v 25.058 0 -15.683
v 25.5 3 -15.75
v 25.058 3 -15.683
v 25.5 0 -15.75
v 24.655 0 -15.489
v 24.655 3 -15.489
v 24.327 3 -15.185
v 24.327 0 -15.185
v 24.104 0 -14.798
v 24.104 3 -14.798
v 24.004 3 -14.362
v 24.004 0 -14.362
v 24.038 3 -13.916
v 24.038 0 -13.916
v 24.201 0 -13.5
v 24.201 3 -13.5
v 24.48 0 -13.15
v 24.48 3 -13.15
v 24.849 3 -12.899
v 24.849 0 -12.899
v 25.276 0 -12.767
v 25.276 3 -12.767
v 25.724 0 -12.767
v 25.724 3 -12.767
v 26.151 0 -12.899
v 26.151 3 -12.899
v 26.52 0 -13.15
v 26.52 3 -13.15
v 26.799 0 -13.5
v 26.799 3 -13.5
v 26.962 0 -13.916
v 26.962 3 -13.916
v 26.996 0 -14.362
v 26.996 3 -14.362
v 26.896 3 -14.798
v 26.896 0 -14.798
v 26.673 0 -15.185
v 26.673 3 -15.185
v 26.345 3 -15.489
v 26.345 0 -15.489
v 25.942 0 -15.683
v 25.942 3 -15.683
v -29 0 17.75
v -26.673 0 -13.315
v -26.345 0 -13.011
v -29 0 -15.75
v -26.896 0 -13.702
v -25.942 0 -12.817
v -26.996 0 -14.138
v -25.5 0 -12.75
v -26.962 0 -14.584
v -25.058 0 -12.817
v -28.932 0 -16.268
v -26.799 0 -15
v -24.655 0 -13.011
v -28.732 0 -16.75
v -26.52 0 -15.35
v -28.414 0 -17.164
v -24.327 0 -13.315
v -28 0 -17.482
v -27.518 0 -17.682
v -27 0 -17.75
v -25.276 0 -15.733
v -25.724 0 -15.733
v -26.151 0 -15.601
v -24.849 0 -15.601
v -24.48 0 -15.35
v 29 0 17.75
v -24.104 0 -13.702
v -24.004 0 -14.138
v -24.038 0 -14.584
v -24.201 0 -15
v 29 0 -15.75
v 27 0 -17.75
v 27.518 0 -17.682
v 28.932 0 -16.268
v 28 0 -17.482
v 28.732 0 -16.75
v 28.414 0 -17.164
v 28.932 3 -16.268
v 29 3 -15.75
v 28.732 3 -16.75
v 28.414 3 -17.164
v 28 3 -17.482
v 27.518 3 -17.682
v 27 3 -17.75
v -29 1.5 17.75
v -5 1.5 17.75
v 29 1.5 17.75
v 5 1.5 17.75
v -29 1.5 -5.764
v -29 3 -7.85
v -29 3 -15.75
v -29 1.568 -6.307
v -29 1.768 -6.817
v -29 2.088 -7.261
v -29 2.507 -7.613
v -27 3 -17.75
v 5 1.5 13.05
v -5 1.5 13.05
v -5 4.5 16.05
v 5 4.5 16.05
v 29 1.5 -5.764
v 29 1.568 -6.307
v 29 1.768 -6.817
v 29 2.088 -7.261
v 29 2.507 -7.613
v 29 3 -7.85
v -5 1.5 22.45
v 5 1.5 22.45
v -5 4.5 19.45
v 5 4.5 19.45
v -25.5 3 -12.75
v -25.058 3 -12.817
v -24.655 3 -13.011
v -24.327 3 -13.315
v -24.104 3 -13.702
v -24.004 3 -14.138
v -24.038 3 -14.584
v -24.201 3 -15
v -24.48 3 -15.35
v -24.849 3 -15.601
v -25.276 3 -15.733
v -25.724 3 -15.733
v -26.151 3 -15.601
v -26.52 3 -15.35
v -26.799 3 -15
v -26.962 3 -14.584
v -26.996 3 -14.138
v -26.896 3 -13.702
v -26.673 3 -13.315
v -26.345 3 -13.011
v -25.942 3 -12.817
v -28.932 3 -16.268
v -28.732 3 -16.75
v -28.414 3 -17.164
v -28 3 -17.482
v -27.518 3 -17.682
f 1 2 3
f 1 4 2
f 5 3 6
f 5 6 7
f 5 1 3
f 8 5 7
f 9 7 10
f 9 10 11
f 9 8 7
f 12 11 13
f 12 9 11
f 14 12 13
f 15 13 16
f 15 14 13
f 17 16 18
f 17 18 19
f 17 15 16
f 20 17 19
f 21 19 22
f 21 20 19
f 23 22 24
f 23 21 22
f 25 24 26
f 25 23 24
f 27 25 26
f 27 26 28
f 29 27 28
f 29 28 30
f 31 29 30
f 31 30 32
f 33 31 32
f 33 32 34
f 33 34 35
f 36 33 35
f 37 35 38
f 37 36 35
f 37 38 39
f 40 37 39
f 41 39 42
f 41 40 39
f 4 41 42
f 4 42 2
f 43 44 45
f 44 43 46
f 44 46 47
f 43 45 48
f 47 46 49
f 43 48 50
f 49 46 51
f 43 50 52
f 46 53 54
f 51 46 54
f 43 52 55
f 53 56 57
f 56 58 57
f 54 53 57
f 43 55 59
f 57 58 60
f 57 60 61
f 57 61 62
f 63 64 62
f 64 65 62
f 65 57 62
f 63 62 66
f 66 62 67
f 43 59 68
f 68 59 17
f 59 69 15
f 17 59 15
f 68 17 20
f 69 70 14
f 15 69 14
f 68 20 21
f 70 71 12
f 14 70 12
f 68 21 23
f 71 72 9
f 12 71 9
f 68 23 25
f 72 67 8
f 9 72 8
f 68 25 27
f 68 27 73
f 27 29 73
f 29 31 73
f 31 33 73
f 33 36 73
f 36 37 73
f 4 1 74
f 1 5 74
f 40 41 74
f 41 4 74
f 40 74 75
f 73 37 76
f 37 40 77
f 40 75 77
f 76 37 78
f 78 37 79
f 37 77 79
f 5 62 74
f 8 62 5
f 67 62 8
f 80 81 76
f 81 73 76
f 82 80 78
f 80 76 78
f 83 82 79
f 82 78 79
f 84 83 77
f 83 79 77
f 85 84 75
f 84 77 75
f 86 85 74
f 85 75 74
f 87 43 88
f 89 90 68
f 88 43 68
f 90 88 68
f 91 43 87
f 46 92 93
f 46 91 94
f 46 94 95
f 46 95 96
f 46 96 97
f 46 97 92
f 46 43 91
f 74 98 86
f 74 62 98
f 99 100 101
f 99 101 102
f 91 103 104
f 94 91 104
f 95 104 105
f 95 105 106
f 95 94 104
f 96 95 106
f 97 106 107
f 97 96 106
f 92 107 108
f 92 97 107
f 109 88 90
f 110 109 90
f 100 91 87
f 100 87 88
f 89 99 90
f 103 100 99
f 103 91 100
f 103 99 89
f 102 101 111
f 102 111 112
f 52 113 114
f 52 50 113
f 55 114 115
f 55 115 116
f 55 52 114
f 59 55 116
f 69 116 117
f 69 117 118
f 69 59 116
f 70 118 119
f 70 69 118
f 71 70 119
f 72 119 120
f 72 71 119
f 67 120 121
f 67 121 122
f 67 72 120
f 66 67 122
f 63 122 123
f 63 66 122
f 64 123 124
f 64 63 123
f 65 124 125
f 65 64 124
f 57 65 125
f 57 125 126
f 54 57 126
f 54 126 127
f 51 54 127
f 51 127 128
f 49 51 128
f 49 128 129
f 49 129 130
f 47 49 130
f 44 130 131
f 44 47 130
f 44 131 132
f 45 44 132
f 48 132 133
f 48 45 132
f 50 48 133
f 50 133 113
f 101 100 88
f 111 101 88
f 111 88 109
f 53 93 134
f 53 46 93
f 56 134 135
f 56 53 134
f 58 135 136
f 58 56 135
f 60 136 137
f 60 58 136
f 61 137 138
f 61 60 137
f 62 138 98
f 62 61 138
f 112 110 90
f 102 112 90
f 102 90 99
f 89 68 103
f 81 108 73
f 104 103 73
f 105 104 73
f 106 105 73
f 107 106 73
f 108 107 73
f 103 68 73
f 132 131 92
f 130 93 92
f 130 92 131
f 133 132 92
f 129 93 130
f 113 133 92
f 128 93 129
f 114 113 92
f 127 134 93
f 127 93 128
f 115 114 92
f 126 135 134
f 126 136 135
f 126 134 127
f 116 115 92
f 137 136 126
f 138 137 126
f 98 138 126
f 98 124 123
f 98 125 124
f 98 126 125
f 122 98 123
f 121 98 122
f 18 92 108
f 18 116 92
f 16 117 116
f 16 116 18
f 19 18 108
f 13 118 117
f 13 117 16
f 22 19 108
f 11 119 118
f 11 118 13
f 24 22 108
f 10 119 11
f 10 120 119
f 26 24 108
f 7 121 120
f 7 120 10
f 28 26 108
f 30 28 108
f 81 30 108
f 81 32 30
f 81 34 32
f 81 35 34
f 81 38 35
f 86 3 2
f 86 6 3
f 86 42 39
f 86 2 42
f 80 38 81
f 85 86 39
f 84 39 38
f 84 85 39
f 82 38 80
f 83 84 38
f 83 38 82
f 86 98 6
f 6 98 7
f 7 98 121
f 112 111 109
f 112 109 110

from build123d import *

# Parameters (mm, degrees)
SKETCH1_W           = 58
SKETCH1_H           = 35.5
SKETCH1_R           = 1.5
BOSS_EXTRUDE1_DEPTH = 1.5
SKETCH2_W           = 58
SKETCH2_H           = 9.9
SKETCH2_R           = 1.5
BOSS_EXTRUDE3_DEPTH = 1.5
FILLET1_R           = 2.2
SKETCH2_3_W         = 10
SKETCH2_3_H         = 4.7
BOSS_EXTRUDE4_DEPTH = 3
CHAMFER1_SIZE       = 3
FILLET2_R           = 2


# Some blends are built 0.0001 mm under size
with BuildPart() as part:
    # Sketch1 → Boss-Extrude1 (new body)
    with BuildSketch(Plane(origin=(0, 0, 0), x_dir=(1, 0, 0), z_dir=(0, 1, 0))):
        Rectangle(SKETCH1_W, SKETCH1_H)
        with Locations(Location((-25.5, 14.25, 0), (0, 0, 270))):
            Circle(SKETCH1_R, mode=Mode.SUBTRACT)
        with Locations(Location((25.5, 14.25, 0), (0, 0, 90))):
            Circle(SKETCH1_R, mode=Mode.SUBTRACT)
    extrude(amount=BOSS_EXTRUDE1_DEPTH)

    # Sketch2 → Boss-Extrude3 (add)
    with BuildSketch(Plane(origin=(0, 1.5, 0), x_dir=(1, 0, 0), z_dir=(0, 1, 0))):
        with Locations((0, 12.8)):
            Rectangle(SKETCH2_W, SKETCH2_H)
        with Locations(Location((-25.5, 14.25, 0), (0, 0, 270))):
            Circle(SKETCH2_R, mode=Mode.SUBTRACT)
        with Locations(Location((25.5, 14.25, 0), (0, 0, 90))):
            Circle(SKETCH2_R, mode=Mode.SUBTRACT)
    extrude(amount=BOSS_EXTRUDE3_DEPTH)

    # Fillet1
    # the kernel refuses this fillet: 2.2 mm, written as the material it adds along each edge
    with BuildSketch(Plane(origin=(-29, 1.5, -7.85), x_dir=(0, 0, 1), z_dir=(1, 0, 0))) as fillet1_piece_1:
        with BuildLine():
            CenterArc((2.085665361, -2.2), FILLET1_R, 90, 71.446995465)
            Line((0, -1.5), (-0.041713307, -1.486))
            ThreePointArc((-0.041713307, -1.486), (-0.044, -0.75), (-0.044, 0))
            Line((-0.044, 0), (0, 0.044))
            Line((0, 0.044), (2.085665361, 0.044))
            Line((2.085665361, 0.044), (2.085665361, 0))
        make_face()
    extrude(amount=58)

    # Sketch2<3> → Boss-Extrude4 (add)
    with BuildSketch(Plane(origin=(0, 1.5, 0), x_dir=(1, 0, 0), z_dir=(0, 1, 0))):
        with Locations((0, -20.1)):
            Rectangle(SKETCH2_3_W, SKETCH2_3_H)
        with Locations((0, -15.4)):
            Rectangle(SKETCH2_3_W, SKETCH2_3_H)
    extrude(amount=BOSS_EXTRUDE4_DEPTH)

    # Chamfer1
    chamfer1_edges = [part.edges().sort_by_distance(p)[0] for p in [
        (0, 4.5, 13.05),
        (0, 4.5, 22.45),
    ]]
    chamfer(chamfer1_edges, length=CHAMFER1_SIZE - 0.0001)  # a hair under: the kernel refuses the full size

    # Fillet2
    fillet2_edges = [part.edges().sort_by_distance(p)[0] for p in [
        (-29, 1.5, -17.75),
        (29, 1.5, -17.75),
    ]]
    fillet(fillet2_edges, radius=FILLET2_R)


solid = part.part
